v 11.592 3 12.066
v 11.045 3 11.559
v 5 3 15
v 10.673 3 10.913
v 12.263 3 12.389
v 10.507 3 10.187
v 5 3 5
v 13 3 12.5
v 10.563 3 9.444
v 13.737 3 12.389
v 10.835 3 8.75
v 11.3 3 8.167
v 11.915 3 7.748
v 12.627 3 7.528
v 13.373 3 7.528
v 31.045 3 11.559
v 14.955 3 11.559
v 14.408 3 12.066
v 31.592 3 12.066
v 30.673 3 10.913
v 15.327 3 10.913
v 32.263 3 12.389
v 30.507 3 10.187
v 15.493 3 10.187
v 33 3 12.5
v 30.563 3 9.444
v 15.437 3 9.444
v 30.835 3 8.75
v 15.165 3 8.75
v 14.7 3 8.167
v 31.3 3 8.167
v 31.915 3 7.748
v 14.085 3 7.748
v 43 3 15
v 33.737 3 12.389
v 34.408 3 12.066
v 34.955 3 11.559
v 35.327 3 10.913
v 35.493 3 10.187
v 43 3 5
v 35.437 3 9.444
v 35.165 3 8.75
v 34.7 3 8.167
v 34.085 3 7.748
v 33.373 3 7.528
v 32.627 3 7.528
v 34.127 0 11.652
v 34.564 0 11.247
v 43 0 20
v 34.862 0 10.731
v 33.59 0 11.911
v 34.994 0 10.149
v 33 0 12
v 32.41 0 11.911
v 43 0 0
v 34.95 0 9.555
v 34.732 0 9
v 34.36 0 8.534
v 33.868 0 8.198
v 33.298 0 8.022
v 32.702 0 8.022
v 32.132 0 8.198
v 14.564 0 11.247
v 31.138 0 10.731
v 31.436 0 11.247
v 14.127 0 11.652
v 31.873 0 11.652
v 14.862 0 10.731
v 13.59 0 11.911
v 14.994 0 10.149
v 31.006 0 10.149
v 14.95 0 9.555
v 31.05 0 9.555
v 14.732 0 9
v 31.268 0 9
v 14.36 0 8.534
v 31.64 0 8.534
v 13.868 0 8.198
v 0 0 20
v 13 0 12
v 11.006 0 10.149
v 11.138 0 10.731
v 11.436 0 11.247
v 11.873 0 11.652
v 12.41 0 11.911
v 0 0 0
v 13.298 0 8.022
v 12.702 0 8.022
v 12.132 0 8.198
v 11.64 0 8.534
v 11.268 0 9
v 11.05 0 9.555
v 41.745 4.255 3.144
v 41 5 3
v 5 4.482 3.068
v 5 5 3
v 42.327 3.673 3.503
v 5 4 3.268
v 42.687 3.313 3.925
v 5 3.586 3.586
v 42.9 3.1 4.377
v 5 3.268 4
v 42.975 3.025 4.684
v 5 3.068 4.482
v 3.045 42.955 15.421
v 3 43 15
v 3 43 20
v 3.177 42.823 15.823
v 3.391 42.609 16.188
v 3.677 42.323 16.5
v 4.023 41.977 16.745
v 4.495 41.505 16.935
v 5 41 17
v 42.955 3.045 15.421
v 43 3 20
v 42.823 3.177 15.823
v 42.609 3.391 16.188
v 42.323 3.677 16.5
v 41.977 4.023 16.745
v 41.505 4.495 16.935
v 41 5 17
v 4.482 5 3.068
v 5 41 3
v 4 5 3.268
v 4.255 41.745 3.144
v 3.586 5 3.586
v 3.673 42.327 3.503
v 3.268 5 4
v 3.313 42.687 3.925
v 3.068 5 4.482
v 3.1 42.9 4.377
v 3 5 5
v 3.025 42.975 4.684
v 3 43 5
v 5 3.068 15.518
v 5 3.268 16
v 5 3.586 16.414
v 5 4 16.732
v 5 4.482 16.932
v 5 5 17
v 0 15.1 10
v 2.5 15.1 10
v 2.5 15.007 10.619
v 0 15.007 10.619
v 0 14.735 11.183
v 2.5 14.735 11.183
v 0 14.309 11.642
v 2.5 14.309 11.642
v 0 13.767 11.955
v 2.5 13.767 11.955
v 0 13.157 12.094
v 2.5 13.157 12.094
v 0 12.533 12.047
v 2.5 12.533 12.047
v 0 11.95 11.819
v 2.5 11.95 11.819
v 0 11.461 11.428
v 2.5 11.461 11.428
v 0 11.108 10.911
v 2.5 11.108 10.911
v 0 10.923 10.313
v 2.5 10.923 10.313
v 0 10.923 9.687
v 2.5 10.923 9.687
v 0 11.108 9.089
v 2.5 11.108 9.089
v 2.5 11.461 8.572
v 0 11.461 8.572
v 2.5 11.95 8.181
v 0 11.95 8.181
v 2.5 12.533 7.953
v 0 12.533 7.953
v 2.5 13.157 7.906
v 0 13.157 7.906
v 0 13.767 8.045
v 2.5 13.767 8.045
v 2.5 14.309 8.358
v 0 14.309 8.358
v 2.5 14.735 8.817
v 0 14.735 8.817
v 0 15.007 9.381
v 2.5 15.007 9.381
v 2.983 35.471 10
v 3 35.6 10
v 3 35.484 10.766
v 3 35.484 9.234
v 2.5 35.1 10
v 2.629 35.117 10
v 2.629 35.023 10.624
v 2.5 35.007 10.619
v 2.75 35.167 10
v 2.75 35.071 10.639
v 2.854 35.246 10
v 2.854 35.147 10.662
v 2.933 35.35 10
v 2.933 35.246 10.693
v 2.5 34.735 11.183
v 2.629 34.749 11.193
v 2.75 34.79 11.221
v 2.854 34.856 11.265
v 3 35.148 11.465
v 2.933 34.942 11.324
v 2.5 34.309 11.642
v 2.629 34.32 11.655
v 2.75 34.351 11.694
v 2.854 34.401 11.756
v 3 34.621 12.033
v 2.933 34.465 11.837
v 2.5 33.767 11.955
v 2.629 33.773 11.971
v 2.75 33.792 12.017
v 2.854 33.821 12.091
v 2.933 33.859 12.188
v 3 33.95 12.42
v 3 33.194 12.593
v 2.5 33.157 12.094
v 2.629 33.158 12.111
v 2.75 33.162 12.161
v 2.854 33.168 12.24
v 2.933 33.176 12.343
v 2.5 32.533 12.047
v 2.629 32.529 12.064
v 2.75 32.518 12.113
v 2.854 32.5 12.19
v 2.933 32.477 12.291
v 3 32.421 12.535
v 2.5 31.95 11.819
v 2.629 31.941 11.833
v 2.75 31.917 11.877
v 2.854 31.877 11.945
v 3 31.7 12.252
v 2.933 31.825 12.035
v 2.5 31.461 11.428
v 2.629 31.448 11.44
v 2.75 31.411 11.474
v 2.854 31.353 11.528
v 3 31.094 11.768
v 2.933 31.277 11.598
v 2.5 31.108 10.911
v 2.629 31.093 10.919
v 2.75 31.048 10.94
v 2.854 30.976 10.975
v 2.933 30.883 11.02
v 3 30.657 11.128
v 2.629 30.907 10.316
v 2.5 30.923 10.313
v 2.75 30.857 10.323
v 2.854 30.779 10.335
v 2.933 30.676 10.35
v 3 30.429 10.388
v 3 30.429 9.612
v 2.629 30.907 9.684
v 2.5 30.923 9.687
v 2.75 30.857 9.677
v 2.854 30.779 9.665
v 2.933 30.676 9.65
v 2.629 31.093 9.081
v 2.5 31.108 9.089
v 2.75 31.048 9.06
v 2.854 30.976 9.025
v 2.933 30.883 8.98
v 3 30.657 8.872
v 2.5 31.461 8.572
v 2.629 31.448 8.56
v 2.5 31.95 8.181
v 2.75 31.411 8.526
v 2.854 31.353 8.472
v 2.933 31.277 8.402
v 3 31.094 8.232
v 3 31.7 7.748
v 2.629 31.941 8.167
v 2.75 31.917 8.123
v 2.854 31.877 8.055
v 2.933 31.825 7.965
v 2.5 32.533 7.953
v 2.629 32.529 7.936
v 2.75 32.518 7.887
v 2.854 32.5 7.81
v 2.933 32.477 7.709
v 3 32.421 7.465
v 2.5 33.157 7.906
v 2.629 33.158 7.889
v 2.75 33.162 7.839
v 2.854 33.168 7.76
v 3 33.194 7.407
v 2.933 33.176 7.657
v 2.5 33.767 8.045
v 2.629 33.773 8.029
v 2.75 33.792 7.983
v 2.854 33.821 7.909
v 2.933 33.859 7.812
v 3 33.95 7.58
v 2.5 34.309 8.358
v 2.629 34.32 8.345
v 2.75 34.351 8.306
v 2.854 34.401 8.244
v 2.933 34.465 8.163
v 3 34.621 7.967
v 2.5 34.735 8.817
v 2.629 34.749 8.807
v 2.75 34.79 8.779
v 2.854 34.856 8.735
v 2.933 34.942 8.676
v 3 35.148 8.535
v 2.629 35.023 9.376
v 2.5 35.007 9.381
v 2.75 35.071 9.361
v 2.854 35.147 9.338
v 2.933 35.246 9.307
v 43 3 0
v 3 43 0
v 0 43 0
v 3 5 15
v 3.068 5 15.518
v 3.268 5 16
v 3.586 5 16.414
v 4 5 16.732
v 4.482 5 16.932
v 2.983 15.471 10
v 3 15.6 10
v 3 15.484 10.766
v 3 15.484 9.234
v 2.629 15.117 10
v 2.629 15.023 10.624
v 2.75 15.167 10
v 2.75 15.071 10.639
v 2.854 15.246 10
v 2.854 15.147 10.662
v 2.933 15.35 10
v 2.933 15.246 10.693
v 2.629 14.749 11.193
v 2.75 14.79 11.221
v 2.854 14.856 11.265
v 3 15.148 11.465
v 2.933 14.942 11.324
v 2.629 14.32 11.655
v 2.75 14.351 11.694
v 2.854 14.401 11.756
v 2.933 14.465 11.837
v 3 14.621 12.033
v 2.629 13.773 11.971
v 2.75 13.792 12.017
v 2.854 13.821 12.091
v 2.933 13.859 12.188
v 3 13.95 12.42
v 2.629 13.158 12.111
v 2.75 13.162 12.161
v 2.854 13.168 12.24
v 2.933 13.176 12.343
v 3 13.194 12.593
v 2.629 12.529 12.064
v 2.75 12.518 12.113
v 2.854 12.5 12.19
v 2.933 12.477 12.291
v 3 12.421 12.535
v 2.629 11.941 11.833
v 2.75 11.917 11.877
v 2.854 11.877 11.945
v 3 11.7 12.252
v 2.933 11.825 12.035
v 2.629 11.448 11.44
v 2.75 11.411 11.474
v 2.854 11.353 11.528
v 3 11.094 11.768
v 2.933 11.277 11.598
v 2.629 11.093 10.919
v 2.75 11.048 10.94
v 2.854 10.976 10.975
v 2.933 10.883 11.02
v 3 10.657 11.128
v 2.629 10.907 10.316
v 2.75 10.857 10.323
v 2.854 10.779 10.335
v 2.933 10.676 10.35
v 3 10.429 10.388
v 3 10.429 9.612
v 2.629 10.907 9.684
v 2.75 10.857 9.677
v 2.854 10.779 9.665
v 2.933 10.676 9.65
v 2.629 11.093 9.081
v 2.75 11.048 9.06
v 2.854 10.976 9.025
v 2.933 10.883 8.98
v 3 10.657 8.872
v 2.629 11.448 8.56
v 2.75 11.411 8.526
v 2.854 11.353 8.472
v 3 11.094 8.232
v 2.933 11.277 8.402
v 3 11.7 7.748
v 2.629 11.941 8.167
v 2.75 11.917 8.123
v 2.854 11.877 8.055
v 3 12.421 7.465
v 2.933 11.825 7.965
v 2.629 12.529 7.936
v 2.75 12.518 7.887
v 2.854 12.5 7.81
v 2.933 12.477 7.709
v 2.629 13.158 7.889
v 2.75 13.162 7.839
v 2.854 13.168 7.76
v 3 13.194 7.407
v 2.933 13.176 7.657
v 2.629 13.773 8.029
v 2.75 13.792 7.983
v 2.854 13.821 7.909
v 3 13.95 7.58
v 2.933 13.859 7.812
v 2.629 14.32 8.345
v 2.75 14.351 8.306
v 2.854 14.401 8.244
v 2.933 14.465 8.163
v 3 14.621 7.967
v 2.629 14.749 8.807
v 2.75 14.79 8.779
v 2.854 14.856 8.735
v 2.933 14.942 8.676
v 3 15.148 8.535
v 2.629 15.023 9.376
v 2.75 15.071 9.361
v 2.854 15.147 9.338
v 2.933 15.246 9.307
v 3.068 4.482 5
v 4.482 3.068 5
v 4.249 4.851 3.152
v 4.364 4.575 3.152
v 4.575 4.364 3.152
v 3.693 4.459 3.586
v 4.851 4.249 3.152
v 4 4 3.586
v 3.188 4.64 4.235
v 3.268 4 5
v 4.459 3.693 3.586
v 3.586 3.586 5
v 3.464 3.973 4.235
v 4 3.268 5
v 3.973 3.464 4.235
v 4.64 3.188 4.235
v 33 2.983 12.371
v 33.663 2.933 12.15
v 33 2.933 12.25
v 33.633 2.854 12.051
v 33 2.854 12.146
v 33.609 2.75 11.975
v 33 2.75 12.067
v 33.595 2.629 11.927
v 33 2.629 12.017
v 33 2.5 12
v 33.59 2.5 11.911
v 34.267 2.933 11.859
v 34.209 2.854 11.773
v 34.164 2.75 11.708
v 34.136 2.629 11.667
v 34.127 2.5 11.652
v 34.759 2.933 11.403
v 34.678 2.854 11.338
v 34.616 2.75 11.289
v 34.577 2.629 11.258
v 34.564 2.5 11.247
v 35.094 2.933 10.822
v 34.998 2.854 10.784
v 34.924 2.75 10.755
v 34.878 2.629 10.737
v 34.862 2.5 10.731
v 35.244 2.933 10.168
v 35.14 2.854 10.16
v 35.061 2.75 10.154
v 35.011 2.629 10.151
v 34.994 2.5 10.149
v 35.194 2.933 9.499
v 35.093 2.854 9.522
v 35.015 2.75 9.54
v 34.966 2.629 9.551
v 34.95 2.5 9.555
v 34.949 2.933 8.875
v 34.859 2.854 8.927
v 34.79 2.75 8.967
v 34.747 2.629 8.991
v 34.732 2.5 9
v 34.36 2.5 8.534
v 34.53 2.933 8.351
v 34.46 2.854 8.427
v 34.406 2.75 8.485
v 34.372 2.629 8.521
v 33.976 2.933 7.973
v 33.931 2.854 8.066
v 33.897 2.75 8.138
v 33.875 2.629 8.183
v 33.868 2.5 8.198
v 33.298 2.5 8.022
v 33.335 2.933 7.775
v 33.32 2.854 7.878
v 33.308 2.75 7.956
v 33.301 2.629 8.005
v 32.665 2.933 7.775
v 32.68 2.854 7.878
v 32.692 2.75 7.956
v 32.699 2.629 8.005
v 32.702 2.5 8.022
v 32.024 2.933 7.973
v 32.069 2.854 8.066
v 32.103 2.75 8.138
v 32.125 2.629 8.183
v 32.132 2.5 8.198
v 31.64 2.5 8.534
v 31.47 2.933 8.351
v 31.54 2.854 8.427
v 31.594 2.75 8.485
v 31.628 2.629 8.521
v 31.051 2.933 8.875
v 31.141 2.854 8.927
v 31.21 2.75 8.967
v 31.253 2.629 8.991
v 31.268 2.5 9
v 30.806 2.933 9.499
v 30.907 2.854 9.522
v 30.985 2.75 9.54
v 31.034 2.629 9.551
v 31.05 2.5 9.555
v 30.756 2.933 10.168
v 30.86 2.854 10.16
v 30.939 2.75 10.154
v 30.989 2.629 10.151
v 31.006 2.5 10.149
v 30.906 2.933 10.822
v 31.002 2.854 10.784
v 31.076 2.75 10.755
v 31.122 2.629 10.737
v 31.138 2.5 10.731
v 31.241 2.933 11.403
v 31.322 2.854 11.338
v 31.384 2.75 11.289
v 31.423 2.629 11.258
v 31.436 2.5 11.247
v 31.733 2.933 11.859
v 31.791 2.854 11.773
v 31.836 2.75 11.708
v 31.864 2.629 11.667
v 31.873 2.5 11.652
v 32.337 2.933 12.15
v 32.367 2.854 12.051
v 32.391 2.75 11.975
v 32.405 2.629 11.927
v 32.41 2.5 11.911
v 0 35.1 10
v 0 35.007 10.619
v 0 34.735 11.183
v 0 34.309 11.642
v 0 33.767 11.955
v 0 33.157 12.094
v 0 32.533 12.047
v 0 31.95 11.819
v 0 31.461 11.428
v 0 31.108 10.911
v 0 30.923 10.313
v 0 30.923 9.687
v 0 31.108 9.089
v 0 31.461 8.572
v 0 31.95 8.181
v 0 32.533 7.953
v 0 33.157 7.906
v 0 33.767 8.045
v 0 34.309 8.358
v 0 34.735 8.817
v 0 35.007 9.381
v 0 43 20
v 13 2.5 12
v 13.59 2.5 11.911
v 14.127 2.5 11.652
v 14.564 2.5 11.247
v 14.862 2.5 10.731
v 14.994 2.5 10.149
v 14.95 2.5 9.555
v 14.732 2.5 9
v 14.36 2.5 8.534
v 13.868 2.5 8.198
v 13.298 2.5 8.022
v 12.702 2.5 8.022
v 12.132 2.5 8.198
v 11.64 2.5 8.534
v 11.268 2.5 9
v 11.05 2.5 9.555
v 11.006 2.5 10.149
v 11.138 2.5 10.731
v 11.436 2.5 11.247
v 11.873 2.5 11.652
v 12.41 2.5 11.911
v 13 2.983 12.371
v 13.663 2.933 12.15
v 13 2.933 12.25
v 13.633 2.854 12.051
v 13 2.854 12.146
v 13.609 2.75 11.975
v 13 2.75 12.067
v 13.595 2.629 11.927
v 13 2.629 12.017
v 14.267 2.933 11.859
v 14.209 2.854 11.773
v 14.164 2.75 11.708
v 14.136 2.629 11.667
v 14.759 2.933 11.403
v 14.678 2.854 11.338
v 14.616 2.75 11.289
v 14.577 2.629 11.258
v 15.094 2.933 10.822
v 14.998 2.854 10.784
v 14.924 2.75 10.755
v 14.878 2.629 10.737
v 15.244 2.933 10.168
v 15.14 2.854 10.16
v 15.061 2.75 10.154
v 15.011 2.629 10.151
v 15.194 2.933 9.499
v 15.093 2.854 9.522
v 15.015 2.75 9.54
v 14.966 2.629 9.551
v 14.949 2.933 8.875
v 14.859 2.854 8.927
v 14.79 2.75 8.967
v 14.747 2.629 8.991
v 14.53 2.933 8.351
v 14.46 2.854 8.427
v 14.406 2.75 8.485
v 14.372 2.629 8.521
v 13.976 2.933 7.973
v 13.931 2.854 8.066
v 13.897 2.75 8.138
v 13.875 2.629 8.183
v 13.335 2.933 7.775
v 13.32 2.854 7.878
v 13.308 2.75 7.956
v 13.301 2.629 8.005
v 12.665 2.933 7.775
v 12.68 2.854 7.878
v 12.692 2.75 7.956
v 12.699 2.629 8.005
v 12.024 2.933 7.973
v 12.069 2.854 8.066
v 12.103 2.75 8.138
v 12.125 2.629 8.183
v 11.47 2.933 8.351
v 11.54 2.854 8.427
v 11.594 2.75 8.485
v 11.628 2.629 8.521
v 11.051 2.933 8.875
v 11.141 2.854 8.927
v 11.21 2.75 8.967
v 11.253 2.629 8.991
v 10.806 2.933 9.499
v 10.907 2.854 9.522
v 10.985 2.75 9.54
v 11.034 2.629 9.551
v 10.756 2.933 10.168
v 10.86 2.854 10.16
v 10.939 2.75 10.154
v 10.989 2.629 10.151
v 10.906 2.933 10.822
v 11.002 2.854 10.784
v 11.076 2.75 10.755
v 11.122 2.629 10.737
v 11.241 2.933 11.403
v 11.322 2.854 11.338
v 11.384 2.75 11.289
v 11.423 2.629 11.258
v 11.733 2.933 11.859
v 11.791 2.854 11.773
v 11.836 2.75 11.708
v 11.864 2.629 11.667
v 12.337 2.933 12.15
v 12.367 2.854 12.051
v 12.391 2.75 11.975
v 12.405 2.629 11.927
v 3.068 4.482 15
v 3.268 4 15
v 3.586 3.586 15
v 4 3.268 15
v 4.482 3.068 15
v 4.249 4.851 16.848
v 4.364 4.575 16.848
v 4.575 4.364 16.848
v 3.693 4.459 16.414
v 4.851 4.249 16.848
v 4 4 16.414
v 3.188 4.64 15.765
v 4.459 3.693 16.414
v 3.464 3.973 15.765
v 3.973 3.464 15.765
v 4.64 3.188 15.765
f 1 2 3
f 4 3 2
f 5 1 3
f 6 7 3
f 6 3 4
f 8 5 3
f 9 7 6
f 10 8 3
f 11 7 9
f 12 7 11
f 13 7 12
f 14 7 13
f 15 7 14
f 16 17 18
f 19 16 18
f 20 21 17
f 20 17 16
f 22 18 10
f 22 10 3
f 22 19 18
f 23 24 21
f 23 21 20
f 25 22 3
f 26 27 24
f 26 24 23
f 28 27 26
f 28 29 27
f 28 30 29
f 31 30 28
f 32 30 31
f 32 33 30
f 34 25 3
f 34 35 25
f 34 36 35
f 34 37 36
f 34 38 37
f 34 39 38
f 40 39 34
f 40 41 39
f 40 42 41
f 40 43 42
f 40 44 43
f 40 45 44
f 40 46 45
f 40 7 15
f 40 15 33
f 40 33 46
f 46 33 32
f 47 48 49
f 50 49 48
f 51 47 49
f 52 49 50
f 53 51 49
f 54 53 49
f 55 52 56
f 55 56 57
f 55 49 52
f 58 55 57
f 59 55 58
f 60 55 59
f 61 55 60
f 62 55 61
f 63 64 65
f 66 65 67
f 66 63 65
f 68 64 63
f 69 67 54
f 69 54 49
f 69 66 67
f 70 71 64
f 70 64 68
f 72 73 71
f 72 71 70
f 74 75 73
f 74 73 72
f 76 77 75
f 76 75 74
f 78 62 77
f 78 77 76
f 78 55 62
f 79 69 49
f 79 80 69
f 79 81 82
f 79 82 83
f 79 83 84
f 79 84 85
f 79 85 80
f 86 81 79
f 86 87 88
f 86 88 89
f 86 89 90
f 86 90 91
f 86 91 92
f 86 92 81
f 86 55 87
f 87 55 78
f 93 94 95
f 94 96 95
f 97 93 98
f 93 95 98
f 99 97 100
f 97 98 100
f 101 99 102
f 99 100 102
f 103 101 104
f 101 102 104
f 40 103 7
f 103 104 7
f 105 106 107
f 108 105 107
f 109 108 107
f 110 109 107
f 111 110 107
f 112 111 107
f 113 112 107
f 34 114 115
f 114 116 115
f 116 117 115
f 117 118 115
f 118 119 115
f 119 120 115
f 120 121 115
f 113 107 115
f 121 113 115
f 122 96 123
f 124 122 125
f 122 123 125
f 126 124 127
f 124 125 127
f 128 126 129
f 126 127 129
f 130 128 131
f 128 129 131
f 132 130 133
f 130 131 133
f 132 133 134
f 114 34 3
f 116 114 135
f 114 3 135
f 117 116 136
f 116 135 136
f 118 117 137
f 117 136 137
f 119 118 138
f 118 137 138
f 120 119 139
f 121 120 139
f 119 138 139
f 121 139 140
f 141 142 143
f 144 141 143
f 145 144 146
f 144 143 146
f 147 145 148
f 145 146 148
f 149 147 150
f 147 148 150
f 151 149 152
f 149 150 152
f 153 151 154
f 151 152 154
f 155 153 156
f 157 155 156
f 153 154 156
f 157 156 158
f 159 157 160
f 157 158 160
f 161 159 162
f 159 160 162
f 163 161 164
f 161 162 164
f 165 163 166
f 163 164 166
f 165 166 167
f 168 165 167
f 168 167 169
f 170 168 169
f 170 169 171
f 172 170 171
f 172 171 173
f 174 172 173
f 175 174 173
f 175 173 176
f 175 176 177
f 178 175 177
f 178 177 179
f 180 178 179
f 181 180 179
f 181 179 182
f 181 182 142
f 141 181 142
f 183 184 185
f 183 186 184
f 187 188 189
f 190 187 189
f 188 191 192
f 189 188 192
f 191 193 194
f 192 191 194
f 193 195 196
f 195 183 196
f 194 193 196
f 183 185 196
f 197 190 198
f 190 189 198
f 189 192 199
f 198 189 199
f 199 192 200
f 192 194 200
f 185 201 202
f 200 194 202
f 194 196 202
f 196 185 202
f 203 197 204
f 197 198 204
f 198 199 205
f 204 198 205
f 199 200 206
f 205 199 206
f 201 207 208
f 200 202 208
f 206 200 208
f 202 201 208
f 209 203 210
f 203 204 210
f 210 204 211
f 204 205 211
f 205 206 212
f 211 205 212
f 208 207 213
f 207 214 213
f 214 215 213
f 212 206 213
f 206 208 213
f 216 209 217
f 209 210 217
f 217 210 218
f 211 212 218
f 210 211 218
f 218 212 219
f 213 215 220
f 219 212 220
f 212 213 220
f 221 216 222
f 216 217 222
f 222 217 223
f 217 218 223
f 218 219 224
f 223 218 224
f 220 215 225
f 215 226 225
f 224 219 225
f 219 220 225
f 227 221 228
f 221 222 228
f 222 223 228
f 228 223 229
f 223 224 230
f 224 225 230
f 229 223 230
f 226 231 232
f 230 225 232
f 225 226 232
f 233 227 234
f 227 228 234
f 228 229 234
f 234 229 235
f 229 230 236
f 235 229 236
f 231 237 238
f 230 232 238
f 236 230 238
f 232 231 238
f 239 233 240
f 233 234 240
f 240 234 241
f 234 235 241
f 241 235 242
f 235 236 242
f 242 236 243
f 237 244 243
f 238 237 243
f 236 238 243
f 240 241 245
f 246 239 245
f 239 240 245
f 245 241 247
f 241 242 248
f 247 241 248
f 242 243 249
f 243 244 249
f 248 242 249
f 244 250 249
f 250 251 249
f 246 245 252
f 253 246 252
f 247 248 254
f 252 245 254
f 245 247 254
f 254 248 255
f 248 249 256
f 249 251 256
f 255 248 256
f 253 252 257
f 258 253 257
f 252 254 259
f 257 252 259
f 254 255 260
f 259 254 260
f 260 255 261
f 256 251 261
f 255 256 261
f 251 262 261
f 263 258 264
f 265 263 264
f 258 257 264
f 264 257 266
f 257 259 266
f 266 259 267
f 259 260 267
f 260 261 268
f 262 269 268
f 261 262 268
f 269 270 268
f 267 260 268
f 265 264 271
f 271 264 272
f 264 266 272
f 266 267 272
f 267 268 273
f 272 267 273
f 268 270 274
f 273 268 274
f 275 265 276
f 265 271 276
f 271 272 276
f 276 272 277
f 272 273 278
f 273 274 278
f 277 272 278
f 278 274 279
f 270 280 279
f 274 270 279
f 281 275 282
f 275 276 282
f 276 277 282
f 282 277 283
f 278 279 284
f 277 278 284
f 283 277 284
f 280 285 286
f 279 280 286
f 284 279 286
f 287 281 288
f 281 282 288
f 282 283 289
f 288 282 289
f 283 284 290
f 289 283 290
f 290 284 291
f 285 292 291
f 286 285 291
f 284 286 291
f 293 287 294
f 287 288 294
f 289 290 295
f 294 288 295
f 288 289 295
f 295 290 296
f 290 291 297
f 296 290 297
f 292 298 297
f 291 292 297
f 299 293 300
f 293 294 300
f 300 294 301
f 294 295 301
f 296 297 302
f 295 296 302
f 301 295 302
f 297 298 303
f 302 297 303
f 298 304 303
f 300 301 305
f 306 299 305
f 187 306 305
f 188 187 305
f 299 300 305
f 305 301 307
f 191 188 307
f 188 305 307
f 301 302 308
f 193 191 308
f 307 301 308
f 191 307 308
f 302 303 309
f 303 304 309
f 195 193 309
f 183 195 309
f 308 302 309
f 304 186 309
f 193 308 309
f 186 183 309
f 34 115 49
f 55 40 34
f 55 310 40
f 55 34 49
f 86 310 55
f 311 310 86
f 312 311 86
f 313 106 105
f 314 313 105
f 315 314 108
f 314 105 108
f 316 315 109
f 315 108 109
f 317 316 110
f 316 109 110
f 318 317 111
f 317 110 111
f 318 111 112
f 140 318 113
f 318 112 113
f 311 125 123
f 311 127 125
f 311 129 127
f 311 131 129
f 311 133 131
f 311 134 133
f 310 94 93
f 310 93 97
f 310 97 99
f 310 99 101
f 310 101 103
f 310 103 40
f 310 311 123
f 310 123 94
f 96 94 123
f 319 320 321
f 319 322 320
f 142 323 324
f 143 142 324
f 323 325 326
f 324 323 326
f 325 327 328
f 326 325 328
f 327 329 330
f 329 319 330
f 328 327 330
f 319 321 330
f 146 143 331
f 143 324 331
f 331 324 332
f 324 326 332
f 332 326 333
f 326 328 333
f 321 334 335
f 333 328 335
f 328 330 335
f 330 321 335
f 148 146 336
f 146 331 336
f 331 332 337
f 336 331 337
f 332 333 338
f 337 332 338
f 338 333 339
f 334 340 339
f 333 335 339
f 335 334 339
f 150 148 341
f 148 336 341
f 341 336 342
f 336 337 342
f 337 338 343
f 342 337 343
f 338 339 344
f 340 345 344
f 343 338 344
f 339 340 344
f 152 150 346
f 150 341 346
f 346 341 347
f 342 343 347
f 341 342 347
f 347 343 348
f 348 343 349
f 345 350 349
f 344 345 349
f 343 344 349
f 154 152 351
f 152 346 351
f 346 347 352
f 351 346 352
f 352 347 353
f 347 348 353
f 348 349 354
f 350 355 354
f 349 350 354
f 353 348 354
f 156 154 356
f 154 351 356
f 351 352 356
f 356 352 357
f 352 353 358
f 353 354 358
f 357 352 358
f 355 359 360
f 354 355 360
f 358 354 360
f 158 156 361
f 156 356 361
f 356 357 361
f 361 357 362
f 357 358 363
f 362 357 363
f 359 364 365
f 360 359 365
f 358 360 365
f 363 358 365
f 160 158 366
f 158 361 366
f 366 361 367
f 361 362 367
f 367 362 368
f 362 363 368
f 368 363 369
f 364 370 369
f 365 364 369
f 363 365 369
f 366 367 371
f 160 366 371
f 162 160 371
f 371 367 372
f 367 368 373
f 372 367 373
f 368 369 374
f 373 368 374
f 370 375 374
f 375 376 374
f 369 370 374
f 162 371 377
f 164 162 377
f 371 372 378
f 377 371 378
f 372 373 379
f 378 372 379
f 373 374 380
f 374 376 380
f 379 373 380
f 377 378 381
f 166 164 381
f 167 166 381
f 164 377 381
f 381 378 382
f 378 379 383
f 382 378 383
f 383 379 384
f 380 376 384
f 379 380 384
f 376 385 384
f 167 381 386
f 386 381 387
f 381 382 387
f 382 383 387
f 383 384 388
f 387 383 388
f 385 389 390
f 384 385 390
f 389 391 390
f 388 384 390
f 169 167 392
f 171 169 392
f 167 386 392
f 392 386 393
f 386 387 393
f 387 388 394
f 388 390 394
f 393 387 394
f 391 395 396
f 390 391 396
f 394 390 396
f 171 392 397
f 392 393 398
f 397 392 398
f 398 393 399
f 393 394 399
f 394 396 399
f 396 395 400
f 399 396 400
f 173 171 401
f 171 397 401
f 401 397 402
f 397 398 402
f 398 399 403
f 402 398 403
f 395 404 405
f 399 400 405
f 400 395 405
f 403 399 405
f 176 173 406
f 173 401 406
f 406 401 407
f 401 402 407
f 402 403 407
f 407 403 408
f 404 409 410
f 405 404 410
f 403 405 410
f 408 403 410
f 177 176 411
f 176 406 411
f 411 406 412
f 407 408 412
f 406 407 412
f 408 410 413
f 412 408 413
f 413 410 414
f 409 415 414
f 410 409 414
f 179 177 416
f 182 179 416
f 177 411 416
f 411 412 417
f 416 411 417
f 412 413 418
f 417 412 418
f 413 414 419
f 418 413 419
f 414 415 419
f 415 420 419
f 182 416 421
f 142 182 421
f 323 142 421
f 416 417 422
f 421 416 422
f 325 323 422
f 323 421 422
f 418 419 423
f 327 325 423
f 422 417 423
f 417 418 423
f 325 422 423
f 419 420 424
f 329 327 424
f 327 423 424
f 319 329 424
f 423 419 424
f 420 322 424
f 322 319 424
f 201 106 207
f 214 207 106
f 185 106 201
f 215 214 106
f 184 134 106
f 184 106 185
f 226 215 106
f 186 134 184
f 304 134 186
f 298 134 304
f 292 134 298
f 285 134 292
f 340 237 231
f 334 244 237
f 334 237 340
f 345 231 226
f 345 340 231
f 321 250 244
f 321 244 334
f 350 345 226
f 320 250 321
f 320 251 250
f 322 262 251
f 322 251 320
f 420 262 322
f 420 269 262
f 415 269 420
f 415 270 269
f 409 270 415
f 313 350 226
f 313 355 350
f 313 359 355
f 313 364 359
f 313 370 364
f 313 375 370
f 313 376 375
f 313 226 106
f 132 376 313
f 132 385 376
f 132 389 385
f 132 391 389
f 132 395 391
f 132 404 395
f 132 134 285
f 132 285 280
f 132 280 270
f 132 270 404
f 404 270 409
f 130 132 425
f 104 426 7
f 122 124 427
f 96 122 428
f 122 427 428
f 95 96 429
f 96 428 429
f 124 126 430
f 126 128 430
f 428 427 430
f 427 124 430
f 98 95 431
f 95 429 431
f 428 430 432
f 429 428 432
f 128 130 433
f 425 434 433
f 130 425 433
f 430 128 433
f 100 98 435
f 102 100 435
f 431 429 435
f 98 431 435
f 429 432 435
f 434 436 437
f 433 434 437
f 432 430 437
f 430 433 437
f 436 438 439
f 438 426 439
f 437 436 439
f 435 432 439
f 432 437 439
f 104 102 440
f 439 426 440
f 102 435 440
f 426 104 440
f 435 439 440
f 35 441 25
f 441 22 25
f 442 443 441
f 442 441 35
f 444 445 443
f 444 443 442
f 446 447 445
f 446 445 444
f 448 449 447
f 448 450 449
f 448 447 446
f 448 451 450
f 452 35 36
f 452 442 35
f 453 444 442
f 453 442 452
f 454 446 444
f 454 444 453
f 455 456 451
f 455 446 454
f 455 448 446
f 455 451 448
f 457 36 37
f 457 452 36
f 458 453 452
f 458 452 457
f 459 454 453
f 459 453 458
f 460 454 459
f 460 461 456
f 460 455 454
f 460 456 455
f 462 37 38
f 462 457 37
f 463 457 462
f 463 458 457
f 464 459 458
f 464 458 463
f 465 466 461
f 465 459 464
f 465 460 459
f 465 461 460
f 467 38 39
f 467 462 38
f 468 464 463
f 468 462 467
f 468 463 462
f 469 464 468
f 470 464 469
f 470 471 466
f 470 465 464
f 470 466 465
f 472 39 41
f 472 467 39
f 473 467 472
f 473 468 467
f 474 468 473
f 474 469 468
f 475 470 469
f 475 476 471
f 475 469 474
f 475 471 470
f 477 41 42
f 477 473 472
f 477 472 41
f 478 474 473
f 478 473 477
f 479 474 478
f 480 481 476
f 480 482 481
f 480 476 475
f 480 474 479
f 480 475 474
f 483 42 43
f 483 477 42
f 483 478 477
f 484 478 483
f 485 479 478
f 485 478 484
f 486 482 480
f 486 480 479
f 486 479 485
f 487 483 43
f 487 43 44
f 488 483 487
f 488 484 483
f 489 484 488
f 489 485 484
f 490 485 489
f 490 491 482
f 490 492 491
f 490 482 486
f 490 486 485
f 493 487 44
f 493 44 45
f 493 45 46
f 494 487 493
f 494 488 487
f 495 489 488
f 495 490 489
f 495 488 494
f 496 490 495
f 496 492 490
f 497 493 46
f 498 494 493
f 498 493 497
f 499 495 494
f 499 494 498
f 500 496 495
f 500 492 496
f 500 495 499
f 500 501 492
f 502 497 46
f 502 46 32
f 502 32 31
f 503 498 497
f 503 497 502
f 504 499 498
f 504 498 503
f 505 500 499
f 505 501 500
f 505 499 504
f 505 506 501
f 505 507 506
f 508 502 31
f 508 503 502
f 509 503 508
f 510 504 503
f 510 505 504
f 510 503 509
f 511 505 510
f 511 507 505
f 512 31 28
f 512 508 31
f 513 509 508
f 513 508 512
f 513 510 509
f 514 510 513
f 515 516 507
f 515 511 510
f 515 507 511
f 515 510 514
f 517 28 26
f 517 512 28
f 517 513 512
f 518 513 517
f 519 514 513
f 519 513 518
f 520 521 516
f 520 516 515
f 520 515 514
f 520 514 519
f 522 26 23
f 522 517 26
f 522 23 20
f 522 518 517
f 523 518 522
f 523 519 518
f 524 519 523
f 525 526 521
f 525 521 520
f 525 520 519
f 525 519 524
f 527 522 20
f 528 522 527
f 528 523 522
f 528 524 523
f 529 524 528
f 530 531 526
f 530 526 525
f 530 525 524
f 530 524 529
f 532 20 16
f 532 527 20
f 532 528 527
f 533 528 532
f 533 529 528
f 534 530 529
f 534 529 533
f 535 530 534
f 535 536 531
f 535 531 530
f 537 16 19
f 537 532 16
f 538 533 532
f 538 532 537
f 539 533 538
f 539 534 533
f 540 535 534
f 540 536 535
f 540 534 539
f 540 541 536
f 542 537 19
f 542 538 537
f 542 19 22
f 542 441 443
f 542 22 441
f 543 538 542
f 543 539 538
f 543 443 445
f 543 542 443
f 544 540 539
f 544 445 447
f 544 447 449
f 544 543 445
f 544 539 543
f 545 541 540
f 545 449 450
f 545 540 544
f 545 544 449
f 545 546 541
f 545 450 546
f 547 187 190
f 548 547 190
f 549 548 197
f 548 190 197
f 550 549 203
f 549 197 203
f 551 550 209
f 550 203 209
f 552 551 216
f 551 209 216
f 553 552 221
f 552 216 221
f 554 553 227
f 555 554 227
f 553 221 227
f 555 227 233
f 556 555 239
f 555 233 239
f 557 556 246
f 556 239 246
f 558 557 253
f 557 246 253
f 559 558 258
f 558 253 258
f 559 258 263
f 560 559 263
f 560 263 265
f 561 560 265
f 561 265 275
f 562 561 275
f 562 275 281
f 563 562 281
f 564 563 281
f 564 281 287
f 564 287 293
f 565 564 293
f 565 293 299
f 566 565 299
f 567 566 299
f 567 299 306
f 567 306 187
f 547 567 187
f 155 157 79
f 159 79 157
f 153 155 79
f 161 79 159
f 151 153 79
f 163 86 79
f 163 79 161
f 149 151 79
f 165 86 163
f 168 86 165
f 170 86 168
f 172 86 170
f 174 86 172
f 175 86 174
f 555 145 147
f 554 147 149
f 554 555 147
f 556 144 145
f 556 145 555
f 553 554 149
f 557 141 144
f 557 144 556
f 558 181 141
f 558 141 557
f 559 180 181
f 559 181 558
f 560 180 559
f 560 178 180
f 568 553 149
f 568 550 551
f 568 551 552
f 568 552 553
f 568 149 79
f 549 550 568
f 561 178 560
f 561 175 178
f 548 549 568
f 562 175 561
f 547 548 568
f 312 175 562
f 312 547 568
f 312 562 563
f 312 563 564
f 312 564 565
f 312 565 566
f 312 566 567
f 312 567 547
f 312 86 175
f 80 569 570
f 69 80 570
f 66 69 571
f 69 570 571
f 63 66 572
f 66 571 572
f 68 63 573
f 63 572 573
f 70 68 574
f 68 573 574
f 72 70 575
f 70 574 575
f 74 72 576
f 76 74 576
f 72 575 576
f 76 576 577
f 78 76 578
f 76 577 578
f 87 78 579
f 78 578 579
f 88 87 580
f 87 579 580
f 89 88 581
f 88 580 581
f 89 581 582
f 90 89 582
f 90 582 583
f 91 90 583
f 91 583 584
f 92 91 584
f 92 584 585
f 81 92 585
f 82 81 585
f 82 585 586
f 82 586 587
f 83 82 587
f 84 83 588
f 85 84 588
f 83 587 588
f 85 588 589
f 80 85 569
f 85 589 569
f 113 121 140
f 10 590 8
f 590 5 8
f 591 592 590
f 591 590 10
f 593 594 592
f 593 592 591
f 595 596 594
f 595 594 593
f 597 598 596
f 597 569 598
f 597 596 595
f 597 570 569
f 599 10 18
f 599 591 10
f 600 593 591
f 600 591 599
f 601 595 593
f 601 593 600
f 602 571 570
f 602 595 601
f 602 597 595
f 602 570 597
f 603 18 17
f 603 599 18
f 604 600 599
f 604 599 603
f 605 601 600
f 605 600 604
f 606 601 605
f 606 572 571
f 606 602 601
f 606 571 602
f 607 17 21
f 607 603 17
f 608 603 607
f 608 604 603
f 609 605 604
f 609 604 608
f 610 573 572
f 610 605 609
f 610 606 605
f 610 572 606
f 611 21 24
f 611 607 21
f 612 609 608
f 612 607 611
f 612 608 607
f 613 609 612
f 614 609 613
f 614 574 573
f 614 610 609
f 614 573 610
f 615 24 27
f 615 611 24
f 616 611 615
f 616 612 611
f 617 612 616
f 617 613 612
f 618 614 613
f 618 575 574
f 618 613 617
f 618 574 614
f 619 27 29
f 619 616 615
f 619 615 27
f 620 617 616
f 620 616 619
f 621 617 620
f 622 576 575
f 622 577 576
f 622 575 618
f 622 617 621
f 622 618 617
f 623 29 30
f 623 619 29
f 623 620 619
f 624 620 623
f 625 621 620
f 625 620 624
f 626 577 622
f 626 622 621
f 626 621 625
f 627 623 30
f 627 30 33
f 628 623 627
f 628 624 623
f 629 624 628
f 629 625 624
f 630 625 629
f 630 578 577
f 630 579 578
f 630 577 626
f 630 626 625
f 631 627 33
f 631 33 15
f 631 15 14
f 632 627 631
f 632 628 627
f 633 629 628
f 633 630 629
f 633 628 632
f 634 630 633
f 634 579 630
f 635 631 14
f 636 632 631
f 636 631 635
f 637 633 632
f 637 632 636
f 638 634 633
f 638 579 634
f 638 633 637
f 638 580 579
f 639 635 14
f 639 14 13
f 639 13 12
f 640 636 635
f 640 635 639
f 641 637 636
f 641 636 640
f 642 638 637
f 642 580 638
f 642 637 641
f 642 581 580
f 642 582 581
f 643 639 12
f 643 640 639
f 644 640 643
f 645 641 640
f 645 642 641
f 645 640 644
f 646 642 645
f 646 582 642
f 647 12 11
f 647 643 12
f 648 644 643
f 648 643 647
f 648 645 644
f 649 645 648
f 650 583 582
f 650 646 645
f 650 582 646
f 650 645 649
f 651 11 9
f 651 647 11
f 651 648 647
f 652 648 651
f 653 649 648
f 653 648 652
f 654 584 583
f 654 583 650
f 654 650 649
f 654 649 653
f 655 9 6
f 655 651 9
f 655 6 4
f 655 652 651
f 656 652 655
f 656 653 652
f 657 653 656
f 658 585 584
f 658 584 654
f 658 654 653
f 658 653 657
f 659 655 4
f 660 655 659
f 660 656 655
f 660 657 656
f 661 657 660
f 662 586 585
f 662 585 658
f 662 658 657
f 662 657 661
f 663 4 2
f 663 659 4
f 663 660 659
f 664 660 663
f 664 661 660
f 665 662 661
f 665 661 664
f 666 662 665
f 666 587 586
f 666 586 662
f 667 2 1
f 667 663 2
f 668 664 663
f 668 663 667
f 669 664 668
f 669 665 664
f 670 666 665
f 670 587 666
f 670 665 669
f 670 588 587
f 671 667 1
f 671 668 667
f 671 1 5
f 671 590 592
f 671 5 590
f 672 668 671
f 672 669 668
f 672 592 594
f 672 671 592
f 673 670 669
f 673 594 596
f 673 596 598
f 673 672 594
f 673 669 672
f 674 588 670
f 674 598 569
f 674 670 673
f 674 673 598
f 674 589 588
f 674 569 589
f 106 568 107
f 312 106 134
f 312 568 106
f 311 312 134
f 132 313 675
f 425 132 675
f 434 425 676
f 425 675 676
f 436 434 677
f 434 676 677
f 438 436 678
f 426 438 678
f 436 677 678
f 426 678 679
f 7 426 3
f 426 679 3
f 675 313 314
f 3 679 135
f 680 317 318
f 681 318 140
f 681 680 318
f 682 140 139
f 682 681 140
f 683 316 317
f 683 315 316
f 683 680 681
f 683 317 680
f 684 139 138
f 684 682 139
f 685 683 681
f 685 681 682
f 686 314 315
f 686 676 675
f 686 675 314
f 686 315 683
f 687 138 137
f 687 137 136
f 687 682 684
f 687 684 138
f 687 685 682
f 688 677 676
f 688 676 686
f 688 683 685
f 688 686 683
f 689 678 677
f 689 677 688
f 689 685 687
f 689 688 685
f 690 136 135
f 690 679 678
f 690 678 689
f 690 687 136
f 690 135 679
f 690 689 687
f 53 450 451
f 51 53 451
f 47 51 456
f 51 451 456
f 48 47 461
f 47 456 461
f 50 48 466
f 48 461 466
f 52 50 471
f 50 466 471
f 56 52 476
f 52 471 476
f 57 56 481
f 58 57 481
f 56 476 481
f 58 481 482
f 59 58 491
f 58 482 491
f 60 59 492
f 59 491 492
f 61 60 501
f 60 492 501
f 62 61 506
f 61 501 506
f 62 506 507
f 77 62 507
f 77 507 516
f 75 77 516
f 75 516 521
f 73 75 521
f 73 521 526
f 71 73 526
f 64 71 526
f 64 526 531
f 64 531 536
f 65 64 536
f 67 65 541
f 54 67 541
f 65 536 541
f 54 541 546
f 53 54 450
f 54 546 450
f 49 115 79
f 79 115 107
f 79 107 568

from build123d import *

# Parameters (mm, degrees)
BOSS_EXTRUDE1_DEPTH = 20
BOSS_EXTRUDE2_DEPTH = 3
BOSS_EXTRUDE3_DEPTH = 3
SKETCH4_R           = 2.1
CUT_EXTRUDE1_DEPTH  = 63.040309477
SKETCH5_R           = 2
CUT_EXTRUDE2_DEPTH  = 3
FILLET3_R           = 2
FILLET4_R           = 0.5


with BuildPart() as part:
    # Sketch1 → Boss-Extrude1 (new body)
    with BuildSketch(Plane.XY):
        Polygon((0, 0), (0, 43), (3, 43), (3, 3), (43, 3), (43, 0), align=None)
    extrude(amount=BOSS_EXTRUDE1_DEPTH)

    # Sketch2 → Boss-Extrude2 (add)
    with BuildSketch(Plane.XY.offset(20)):
        Polygon((3, 43), (43, 3), (3, 3), align=None)
    extrude(amount=-BOSS_EXTRUDE2_DEPTH)

    # Sketch3 → Boss-Extrude3 (add)
    with BuildSketch(Plane(origin=(0, 0, 0), x_dir=(-1, 0, 0), z_dir=(0, 0, -1))):
        Polygon((-3, 43), (-43, 3), (-3, 3), align=None)
    extrude(amount=-BOSS_EXTRUDE3_DEPTH)

    # Sketch4 → Cut-Extrude1 (cut, through all)
    with BuildSketch(Plane(origin=(3, 0, 0), x_dir=(0, 0, -1), z_dir=(1, 0, 0))):
        with Locations(Location((-10, 33, 0), (0, 0, 90))):
            Circle(SKETCH4_R)
        with Locations(Location((-10, 13, 0), (0, 0, 90))):
            Circle(SKETCH4_R)
    extrude(amount=-CUT_EXTRUDE1_DEPTH, mode=Mode.SUBTRACT)

    # Sketch5 → Cut-Extrude2 (cut)
    with BuildSketch(Plane(origin=(0, 3, 0), x_dir=(1, 0, 0), z_dir=(0, 1, 0))):
        with Locations(Location((13, -10, 0), (0, 0, 270))):
            Circle(SKETCH5_R)
        with Locations(Location((33, -10, 0), (0, 0, 270))):
            Circle(SKETCH5_R)
    extrude(amount=-CUT_EXTRUDE2_DEPTH, mode=Mode.SUBTRACT)

    # Fillet3
    fillet3_edges = [part.edges().sort_by_distance(p)[0] for p in [
        (3, 3, 10),
        (3, 23, 17),
        (23, 3, 17),
        (3, 23, 3),
        (23, 3, 3),
    ]]
    fillet(fillet3_edges, radius=FILLET3_R)

    # Fillet4
    fillet4_edges = [part.edges().sort_by_distance(p)[0] for p in [
        (3, 30.9, 10),
        (3, 10.9, 10),
        (13, 3, 8),
        (33, 3, 8),
    ]]
    fillet(fillet4_edges, radius=FILLET4_R)


solid = part.part
